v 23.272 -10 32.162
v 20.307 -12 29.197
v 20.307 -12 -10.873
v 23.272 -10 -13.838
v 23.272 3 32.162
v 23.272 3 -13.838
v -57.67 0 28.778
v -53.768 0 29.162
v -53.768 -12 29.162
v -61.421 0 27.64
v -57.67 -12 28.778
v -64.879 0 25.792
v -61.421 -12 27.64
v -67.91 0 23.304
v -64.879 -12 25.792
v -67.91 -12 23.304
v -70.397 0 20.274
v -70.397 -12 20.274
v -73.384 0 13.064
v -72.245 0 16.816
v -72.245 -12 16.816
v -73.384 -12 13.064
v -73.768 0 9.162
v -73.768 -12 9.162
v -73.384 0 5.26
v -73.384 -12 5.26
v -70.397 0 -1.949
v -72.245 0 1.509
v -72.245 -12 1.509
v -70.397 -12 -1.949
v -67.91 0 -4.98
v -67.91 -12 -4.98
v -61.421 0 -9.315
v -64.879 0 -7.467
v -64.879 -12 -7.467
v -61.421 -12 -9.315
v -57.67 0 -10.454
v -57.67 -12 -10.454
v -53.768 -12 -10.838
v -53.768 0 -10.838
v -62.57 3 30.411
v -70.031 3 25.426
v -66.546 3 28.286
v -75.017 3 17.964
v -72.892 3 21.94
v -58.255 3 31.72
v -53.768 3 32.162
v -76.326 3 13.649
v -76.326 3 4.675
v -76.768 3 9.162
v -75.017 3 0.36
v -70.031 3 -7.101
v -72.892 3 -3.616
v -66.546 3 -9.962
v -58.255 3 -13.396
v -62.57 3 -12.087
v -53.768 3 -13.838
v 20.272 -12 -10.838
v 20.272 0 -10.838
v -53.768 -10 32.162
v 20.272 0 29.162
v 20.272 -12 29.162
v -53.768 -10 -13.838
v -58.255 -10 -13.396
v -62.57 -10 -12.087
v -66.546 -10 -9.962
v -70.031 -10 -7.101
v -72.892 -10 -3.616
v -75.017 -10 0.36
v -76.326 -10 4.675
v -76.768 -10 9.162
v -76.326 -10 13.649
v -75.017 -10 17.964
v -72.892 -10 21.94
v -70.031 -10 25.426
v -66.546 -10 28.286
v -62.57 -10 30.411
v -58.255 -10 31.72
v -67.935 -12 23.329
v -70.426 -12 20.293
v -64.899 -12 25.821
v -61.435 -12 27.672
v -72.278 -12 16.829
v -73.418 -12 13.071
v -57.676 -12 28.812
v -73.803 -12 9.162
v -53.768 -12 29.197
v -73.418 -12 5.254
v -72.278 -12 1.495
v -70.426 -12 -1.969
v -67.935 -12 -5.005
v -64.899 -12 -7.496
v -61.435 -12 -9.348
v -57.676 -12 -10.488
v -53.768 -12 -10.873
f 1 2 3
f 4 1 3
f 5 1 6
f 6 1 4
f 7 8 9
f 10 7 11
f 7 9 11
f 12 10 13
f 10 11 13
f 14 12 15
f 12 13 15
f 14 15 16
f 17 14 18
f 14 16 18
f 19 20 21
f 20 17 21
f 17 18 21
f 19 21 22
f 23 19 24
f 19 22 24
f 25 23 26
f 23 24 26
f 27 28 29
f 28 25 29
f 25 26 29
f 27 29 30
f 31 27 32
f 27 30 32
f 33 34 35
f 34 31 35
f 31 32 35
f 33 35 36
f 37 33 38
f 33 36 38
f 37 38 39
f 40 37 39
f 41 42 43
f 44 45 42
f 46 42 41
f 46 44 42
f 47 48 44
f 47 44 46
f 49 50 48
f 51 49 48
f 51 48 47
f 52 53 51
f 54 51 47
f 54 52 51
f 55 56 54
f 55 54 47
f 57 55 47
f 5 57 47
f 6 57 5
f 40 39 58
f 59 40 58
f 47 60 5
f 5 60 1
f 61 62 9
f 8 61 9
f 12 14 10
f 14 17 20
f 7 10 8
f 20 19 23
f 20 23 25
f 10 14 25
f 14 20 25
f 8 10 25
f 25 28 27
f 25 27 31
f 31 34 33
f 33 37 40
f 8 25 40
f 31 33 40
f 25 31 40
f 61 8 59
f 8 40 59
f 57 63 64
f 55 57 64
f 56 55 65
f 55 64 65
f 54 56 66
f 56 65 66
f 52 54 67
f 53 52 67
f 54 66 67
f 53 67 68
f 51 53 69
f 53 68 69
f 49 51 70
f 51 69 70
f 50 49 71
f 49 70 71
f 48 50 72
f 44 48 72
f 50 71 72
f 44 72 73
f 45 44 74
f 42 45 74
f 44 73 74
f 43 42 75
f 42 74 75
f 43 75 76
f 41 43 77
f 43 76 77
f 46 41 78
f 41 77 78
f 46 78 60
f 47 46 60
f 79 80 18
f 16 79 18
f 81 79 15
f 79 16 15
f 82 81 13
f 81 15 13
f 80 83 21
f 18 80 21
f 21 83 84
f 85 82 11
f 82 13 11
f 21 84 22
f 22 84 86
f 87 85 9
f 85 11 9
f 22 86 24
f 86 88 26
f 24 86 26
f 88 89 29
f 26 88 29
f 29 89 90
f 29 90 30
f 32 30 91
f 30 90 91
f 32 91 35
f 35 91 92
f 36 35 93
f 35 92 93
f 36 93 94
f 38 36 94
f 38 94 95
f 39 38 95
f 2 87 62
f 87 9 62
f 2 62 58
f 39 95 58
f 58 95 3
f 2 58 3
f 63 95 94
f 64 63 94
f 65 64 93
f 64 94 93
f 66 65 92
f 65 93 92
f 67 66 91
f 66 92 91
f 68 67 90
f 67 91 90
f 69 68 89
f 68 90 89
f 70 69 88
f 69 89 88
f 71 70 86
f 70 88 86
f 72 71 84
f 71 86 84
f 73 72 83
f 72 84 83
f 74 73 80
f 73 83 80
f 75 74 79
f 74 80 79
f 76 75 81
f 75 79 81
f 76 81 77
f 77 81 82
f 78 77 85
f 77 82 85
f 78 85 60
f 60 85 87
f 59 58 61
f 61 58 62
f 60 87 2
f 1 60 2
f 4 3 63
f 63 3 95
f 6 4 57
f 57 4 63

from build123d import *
from OCP.BRepFilletAPI import BRepFilletAPI_MakeChamfer

# Parameters (mm, degrees)
BOSS_EXTRUDE1_DEPTH = 3
BOSS_EXTRUDE3_START = -15
BOSS_EXTRUDE3_DEPTH = 15
CHAMFER2_SIZE       = 2
CHAMFER2_SIZE2      = 2.965121937


with BuildPart() as part:
    # Sketch1 → Boss-Extrude1 (new body)
    with BuildSketch(Plane(origin=(0, 0, 0), x_dir=(1, 0, 0), z_dir=(0, 1, 0))):
        with BuildLine():
            Line((20.272183792, 10.837794599), (-53.767816208, 10.837794599))
            ThreePointArc((-53.767816208, 10.837794599), (-39.625680584, 4.979930223), (-33.767816208, -9.162205401))
            ThreePointArc((-33.767816208, -9.162205401), (-39.625680584, -23.304341024), (-53.767816208, -29.162205401))
            Line((-53.767816208, -29.162205401), (20.272183792, -29.162205401))
            Line((20.272183792, -29.162205401), (20.272183792, 10.837794599))
        make_face()
        with BuildLine():
            ThreePointArc((-33.767816208, -9.162205401), (-39.625680584, 4.979930223), (-53.767816208, 10.837794599))
            Line((-53.767816208, 10.837794599), (-53.767816208, -29.162205401))
            ThreePointArc((-53.767816208, -29.162205401), (-39.625680584, -23.304341024), (-33.767816208, -9.162205401))
        make_face()
        with BuildLine():
            Line((-53.767816208, -29.162205401), (-53.767816208, 10.837794599))
            ThreePointArc((-53.767816208, 10.837794599), (-73.767816208, -9.162205401), (-53.767816208, -29.162205401))
        make_face()
        with BuildLine():
            ThreePointArc((-33.767816208, -9.162205401), (-39.625680584, 4.979930223), (-53.767816208, 10.837794599))
            Line((-53.767816208, 10.837794599), (-53.767816208, -29.162205401))
            ThreePointArc((-53.767816208, -29.162205401), (-39.625680584, -23.304341024), (-33.767816208, -9.162205401))
        make_face()
        with BuildLine():
            Line((-53.767816208, -29.162205401), (-53.767816208, 10.837794599))
            ThreePointArc((-53.767816208, 10.837794599), (-73.767816208, -9.162205401), (-53.767816208, -29.162205401))
        make_face()
    extrude(amount=BOSS_EXTRUDE1_DEPTH)

    # Sketch2 → Boss-Extrude3 (add)
    with BuildSketch(Plane(origin=(0, 3, 0), x_dir=(1, 0, 0), z_dir=(0, 1, 0)).offset(BOSS_EXTRUDE3_START)):
        with BuildLine():
            ThreePointArc((-53.767816208, -29.162205401), (-73.767816208, -9.162205401), (-53.767816208, 10.837794599))
            Line((-53.767816208, 10.837794599), (-53.767816208, 13.837794599))
            ThreePointArc((-53.767816208, 13.837794599), (-76.767816208, -9.162205401), (-53.767816208, -32.162205401))
            Line((-53.767816208, -32.162205401), (-53.767816208, -29.162205401))
        make_face()
        with BuildLine():
            Line((-53.767816208, 13.837794599), (-53.767816208, 10.837794599))
            Line((-53.767816208, 10.837794599), (-42.409999516, 10.837794599))
            ThreePointArc((-42.409999516, 10.837794599), (-47.894146145, 13.075150557), (-53.767816208, 13.837794599))
        make_face()
        with BuildLine():
            Line((-42.409999516, -29.162205401), (-53.767816208, -29.162205401))
            Line((-53.767816208, -29.162205401), (-53.767816208, -32.162205401))
            ThreePointArc((-53.767816208, -32.162205401), (-47.894146145, -31.399561359), (-42.409999516, -29.162205401))
        make_face()
        with BuildLine():
            Line((23.272183792, 13.837794599), (-53.767816208, 13.837794599))
            ThreePointArc((-53.767816208, 13.837794599), (-47.894146145, 13.075150557), (-42.409999516, 10.837794599))
            Line((-42.409999516, 10.837794599), (20.272183792, 10.837794599))
            Line((20.272183792, 10.837794599), (20.272183792, -29.162205401))
            Line((20.272183792, -29.162205401), (-42.409999516, -29.162205401))
            ThreePointArc((-42.409999516, -29.162205401), (-47.894146145, -31.399561359), (-53.767816208, -32.162205401))
            Line((-53.767816208, -32.162205401), (23.272183792, -32.162205401))
            Line((23.272183792, -32.162205401), (23.272183792, 13.837794599))
        make_face()
    extrude(amount=BOSS_EXTRUDE3_DEPTH)

    # Chamfer2: one chamfer whose edges measure the first distance from different faces: ONE call of the kernel's chamfer builder (chamfer() names one face for all edges)
    chamfer2_edges_1 = [part.edges().sort_by_distance(p)[0] for p in [
        (-76.767816208, -12, 9.162205401),
    ]]
    chamfer2_side_1 = [part.faces().sort_by_distance(p)[0] for p in [
        (-76.767816208, -4.5, 9.162205401),
    ]]
    chamfer2_edges_2 = [part.edges().sort_by_distance(p)[0] for p in [
        (-15.247816208, -12, -13.837794599),
    ]]
    chamfer2_side_2 = [part.faces().sort_by_distance(p)[0] for p in [
        (-15.247816208, -4.5, -13.837794599),
    ]]
    chamfer2_edges_3 = [part.edges().sort_by_distance(p)[0] for p in [
        (23.272183792, -12, 9.162205401),
    ]]
    chamfer2_side_3 = [part.faces().sort_by_distance(p)[0] for p in [
        (23.272183792, -4.5, 9.162205401),
    ]]
    chamfer2_edges_4 = [part.edges().sort_by_distance(p)[0] for p in [
        (-15.247816208, -12, 32.162205401),
    ]]
    chamfer2_side_4 = [part.faces().sort_by_distance(p)[0] for p in [
        (-15.247816208, -4.5, 32.162205401),
    ]]
    chamfer2 = BRepFilletAPI_MakeChamfer(part.part.solid().wrapped)
    for e in chamfer2_edges_1:
        chamfer2.Add(CHAMFER2_SIZE, CHAMFER2_SIZE2, e.wrapped, chamfer2_side_1[0].wrapped)  # the first distance lies on this face
    for e in chamfer2_edges_2:
        chamfer2.Add(CHAMFER2_SIZE, CHAMFER2_SIZE2, e.wrapped, chamfer2_side_2[0].wrapped)  # the first distance lies on this face
    for e in chamfer2_edges_3:
        chamfer2.Add(CHAMFER2_SIZE, CHAMFER2_SIZE2, e.wrapped, chamfer2_side_3[0].wrapped)  # the first distance lies on this face
    for e in chamfer2_edges_4:
        chamfer2.Add(CHAMFER2_SIZE, CHAMFER2_SIZE2, e.wrapped, chamfer2_side_4[0].wrapped)  # the first distance lies on this face
    add(Compound.cast(chamfer2.Shape()), mode=Mode.REPLACE)


solid = part.part
